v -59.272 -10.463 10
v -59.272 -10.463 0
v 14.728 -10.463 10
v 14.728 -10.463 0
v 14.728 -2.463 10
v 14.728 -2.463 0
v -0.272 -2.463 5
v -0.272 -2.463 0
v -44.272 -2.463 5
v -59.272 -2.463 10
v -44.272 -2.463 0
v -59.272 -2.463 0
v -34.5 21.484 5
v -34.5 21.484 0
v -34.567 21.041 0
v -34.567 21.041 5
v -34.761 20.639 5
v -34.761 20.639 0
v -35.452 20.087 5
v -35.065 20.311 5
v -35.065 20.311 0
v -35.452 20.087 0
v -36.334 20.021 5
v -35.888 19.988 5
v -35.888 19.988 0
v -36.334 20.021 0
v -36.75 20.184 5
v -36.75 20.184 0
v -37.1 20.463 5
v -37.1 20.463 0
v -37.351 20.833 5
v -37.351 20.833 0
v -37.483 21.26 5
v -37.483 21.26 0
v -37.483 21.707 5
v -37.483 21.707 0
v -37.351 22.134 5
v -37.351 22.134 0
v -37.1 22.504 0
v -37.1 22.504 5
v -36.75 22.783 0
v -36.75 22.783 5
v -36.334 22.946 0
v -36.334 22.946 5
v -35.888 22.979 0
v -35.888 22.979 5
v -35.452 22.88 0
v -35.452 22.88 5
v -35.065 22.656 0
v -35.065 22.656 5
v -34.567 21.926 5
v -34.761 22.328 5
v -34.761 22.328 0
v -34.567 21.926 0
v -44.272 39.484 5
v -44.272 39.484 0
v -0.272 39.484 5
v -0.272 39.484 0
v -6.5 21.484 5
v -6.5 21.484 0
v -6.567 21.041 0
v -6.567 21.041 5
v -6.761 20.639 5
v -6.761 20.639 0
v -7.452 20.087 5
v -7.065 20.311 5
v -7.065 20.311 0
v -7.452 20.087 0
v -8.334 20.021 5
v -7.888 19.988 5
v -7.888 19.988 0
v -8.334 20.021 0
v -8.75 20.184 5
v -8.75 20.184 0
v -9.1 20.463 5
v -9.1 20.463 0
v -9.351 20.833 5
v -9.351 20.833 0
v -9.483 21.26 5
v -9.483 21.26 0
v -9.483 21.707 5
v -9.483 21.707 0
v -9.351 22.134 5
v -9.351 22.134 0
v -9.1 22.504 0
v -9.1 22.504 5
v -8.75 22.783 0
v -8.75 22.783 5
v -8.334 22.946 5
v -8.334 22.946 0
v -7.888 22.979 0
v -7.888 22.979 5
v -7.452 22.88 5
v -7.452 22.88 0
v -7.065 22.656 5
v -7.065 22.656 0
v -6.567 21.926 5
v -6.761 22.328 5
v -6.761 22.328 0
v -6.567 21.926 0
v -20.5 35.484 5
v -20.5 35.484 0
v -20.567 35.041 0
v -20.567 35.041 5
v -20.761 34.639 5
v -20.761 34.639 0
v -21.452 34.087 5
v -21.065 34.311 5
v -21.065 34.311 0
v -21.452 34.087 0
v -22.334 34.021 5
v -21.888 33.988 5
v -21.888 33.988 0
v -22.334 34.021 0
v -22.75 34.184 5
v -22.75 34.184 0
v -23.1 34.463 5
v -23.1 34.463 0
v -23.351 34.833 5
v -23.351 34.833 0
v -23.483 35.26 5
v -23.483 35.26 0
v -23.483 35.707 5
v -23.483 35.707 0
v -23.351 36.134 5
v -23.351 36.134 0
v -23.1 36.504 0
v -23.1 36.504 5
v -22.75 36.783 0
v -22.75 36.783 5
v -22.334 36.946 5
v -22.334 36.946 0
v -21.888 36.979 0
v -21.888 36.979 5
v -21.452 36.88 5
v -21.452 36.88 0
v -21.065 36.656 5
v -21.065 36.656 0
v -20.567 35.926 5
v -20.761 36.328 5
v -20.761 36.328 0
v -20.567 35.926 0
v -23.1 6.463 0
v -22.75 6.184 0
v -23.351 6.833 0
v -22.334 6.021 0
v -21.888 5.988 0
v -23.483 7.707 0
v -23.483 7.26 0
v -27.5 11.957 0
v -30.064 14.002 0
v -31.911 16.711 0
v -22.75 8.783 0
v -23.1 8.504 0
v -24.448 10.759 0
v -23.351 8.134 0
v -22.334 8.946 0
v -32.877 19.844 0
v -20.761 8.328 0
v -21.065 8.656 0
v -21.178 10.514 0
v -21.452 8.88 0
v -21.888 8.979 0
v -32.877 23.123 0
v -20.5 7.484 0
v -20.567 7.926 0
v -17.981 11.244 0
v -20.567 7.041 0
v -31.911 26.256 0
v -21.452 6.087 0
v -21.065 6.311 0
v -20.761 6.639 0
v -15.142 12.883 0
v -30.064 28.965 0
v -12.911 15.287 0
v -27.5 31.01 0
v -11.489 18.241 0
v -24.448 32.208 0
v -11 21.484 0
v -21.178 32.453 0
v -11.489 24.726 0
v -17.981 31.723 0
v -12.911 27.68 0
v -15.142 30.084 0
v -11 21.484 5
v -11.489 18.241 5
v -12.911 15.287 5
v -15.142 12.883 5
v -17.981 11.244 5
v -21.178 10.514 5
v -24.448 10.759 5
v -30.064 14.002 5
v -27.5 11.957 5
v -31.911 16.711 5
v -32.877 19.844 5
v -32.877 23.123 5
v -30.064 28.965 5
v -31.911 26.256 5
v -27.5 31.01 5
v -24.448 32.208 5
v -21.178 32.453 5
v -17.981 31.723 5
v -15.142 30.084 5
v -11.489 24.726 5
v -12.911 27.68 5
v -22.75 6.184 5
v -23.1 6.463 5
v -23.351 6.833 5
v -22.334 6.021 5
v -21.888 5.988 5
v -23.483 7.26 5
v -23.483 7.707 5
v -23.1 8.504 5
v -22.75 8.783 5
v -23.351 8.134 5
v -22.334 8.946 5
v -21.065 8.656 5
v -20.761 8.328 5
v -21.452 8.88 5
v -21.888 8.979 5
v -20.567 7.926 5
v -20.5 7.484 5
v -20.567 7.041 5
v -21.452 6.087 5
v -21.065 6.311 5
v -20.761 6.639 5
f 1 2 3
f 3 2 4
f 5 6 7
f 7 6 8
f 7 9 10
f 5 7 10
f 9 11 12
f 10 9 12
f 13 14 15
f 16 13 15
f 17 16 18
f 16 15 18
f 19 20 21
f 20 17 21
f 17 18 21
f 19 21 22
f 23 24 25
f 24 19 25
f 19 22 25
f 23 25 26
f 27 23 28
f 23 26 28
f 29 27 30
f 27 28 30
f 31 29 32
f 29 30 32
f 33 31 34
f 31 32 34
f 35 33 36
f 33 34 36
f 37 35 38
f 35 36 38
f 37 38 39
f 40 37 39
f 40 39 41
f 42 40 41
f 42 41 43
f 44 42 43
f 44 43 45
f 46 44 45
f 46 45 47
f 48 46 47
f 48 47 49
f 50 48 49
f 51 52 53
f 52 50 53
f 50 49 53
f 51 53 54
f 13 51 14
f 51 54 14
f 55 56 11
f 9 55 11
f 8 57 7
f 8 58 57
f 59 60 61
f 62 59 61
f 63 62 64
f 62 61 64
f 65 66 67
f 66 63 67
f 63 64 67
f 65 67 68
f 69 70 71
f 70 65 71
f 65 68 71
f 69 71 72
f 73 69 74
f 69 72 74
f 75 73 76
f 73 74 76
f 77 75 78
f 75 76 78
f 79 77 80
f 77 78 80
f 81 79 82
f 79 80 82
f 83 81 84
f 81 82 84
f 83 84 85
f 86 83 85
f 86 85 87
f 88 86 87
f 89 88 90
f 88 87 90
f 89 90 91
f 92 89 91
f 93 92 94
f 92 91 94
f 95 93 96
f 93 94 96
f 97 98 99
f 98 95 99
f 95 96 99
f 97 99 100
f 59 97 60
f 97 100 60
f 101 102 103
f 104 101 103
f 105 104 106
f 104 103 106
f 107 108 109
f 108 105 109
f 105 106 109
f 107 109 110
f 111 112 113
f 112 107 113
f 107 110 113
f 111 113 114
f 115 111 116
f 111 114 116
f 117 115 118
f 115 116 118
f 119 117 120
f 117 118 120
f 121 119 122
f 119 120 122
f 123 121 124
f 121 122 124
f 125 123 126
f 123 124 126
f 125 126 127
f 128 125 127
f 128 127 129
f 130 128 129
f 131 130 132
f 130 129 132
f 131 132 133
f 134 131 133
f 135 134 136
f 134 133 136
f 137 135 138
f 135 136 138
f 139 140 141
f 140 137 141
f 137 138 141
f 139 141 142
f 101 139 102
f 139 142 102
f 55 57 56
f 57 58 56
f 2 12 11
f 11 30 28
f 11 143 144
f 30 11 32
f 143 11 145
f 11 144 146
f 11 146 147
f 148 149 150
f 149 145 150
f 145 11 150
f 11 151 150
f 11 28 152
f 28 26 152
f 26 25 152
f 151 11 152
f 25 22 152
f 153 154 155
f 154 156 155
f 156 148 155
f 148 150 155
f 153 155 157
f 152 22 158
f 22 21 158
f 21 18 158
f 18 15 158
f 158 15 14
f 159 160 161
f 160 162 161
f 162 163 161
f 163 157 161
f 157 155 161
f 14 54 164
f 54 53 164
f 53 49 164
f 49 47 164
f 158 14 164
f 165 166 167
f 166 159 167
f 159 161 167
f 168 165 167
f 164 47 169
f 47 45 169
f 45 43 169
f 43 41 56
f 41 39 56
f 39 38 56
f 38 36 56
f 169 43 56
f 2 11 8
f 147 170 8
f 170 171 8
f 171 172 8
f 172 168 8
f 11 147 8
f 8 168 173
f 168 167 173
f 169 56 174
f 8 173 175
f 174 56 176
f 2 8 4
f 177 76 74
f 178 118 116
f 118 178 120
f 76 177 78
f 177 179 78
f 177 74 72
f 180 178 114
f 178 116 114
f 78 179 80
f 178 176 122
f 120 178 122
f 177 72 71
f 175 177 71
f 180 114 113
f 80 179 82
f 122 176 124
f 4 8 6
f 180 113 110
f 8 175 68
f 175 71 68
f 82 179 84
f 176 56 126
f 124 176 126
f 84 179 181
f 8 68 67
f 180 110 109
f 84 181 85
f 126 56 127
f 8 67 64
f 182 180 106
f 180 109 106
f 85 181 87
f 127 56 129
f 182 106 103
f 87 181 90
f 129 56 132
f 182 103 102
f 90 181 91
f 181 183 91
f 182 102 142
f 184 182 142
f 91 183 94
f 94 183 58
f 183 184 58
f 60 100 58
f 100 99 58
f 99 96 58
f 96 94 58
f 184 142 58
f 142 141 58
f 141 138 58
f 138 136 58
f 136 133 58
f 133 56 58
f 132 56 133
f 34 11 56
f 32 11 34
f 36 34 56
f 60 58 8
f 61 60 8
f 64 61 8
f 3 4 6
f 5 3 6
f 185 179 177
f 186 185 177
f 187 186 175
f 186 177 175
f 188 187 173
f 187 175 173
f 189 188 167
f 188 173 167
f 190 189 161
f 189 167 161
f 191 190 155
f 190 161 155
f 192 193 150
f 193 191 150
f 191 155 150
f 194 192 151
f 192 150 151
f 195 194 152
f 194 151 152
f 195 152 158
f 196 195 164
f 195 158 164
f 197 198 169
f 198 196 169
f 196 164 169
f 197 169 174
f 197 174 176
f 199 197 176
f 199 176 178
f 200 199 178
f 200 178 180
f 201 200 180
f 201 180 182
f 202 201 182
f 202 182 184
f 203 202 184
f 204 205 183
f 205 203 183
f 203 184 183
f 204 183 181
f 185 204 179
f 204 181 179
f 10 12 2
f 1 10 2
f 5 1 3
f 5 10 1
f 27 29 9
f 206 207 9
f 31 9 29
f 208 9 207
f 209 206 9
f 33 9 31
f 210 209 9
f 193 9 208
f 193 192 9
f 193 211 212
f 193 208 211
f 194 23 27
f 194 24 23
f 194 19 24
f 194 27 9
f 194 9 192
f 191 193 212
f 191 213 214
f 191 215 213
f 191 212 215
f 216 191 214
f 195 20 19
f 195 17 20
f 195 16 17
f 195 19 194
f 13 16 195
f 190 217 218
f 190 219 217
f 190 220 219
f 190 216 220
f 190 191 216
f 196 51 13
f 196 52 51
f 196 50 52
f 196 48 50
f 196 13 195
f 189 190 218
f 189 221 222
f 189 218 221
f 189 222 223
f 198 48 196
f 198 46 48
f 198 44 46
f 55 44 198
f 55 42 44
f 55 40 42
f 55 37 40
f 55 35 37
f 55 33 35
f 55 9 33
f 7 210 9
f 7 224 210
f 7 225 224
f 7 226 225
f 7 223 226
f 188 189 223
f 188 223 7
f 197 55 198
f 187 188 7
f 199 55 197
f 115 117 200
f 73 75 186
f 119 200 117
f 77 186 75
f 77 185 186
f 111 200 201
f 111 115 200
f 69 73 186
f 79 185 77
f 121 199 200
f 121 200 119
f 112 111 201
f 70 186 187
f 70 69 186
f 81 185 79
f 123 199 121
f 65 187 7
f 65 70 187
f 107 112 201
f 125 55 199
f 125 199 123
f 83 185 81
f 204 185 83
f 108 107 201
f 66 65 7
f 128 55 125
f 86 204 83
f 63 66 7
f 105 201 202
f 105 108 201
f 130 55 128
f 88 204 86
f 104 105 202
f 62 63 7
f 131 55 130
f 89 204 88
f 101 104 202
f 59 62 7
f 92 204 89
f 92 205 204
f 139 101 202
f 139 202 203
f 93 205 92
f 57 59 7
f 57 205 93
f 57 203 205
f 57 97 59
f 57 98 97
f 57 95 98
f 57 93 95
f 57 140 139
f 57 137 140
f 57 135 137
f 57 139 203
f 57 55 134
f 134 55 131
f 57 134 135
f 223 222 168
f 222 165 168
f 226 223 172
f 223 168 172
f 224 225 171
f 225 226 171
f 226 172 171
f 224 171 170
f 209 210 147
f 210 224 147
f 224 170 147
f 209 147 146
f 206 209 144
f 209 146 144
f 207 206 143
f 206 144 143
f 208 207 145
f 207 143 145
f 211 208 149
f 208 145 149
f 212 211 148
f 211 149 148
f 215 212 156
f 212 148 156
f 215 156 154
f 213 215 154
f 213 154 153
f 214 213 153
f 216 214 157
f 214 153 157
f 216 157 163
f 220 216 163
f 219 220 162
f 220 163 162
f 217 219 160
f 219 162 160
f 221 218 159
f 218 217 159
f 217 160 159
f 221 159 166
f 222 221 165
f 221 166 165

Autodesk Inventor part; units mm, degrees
ref_plane "YZ Plane" through (0, 0, 0) normal (1, 0, 0) x (0, 1, 0)
ref_plane "XZ Plane" through (0, 0, 0) normal (0, 1, 0) x (-1, 0, 0)
ref_plane "XY Plane" through (0, 0, 0) normal (0, 0, 1) x (1, 0, 0)
sketch "Skizze1" plane through (0, 0, 0) normal (0, 0, 1) x (1, 0, 0)
  line L0 (-0.2717, 2) -> (-0.2717, -2.4631) projected
  arc A0 (-2.2717, 0) -> (-0.2717, 2) centre (-2.2717, 2) ccw projected
  line L1 (-42.2717, 0) -> (-2.2717, 0) projected
  arc A1 (-44.2717, 2) -> (-42.2717, 0) centre (-42.2717, 2) ccw projected
  line L2 (-44.2717, 2) -> (-44.2717, -2.4631) projected
  line L3 (-44.2717, -2.4631) -> (-59.2717, -2.4631) projected
  line L4 (-59.2717, -10.4631) -> (-59.2717, -2.4631) projected
  line L5 (-37.1489, -10.4631) -> (-59.2717, -10.4631) projected
  line L6 (-37.1489, -7.4631) -> (-37.1489, -10.4631) projected
  line L7 (-26.4444, -7.4631) -> (-37.1489, -7.4631) projected
  line L8 (-26.4444, -10.4631) -> (-26.4444, -7.4631) projected
  line L9 (-18.0989, -10.4631) -> (-26.4444, -10.4631) projected
  line L10 (-18.0989, -7.4631) -> (-18.0989, -10.4631) projected
  line L11 (-7.3944, -7.4631) -> (-18.0989, -7.4631) projected
  line L12 (-7.3944, -10.4631) -> (-7.3944, -7.4631) projected
  line L13 (14.7283, -10.4631) -> (-7.3944, -10.4631) projected
  line L14 (14.7283, -10.4631) -> (14.7283, -2.4631) projected
  line L15 (14.7283, -2.4631) -> (-0.2717, -2.4631) projected
  circle A2 centre (-22, 7.4835) radius 1.5 projected
  circle A3 centre (-36, 21.4835) radius 1.5 projected
  circle A4 centre (-22, 35.4835) radius 1.5 projected
  circle A5 centre (-8, 21.4835) radius 1.5 projected
  circle A6 centre (-22, 21.4835) radius 18 projected
  circle A7 centre (-22, 21.4835) radius 11 projected
  line L16 (-44.2717, -10.4631) -> (-0.2717, -10.4631)
  line L17 (-0.2717, -10.4631) -> (-0.2717, 39.4835)
  line L18 (-0.2717, 39.4835) -> (-44.2717, 39.4835)
  line L19 (-44.2717, 39.4835) -> (-44.2717, -10.4631)
  point P0 (0, 0)
extrude "Extrusion1" add sketch "Skizze1" along normal blind 5 contours L0 L17 L13 L12 L11 L10 L9 L8 L7 L6 L5 L19 L2 A1 L1 A0 | A6 | A0 L1 A1 L19 L18 L17 | L15 L14 L13 L17 | L16 L10 L11 L12 | L19 L5 L4 L3 | L16 L6 L7 L8
sketch "Skizze2" plane through (0, 0, 5) normal (0, 0, 1) x (1, 0, 0)
  line L0 (-59.2717, -10.4631) -> (14.7283, -10.4631) projected
  line L1 (14.7283, -10.4631) -> (14.7283, -2.4631) projected
  line L2 (-59.2717, -10.4631) -> (14.7283, -10.4631)
  line L3 (14.7283, -10.4631) -> (14.7283, -2.4631)
  line L4 (14.7283, -2.4631) -> (-59.2717, -2.4631)
  line L5 (-59.2717, -2.4631) -> (-59.2717, -10.4631)
  point P0 (0, 0)
extrude "Extrusion2" add sketch "Skizze2" along normal blind 5
properties part number "Shoulder_stepper_holder" material "ABS-Kunststoff - Schwarz"
